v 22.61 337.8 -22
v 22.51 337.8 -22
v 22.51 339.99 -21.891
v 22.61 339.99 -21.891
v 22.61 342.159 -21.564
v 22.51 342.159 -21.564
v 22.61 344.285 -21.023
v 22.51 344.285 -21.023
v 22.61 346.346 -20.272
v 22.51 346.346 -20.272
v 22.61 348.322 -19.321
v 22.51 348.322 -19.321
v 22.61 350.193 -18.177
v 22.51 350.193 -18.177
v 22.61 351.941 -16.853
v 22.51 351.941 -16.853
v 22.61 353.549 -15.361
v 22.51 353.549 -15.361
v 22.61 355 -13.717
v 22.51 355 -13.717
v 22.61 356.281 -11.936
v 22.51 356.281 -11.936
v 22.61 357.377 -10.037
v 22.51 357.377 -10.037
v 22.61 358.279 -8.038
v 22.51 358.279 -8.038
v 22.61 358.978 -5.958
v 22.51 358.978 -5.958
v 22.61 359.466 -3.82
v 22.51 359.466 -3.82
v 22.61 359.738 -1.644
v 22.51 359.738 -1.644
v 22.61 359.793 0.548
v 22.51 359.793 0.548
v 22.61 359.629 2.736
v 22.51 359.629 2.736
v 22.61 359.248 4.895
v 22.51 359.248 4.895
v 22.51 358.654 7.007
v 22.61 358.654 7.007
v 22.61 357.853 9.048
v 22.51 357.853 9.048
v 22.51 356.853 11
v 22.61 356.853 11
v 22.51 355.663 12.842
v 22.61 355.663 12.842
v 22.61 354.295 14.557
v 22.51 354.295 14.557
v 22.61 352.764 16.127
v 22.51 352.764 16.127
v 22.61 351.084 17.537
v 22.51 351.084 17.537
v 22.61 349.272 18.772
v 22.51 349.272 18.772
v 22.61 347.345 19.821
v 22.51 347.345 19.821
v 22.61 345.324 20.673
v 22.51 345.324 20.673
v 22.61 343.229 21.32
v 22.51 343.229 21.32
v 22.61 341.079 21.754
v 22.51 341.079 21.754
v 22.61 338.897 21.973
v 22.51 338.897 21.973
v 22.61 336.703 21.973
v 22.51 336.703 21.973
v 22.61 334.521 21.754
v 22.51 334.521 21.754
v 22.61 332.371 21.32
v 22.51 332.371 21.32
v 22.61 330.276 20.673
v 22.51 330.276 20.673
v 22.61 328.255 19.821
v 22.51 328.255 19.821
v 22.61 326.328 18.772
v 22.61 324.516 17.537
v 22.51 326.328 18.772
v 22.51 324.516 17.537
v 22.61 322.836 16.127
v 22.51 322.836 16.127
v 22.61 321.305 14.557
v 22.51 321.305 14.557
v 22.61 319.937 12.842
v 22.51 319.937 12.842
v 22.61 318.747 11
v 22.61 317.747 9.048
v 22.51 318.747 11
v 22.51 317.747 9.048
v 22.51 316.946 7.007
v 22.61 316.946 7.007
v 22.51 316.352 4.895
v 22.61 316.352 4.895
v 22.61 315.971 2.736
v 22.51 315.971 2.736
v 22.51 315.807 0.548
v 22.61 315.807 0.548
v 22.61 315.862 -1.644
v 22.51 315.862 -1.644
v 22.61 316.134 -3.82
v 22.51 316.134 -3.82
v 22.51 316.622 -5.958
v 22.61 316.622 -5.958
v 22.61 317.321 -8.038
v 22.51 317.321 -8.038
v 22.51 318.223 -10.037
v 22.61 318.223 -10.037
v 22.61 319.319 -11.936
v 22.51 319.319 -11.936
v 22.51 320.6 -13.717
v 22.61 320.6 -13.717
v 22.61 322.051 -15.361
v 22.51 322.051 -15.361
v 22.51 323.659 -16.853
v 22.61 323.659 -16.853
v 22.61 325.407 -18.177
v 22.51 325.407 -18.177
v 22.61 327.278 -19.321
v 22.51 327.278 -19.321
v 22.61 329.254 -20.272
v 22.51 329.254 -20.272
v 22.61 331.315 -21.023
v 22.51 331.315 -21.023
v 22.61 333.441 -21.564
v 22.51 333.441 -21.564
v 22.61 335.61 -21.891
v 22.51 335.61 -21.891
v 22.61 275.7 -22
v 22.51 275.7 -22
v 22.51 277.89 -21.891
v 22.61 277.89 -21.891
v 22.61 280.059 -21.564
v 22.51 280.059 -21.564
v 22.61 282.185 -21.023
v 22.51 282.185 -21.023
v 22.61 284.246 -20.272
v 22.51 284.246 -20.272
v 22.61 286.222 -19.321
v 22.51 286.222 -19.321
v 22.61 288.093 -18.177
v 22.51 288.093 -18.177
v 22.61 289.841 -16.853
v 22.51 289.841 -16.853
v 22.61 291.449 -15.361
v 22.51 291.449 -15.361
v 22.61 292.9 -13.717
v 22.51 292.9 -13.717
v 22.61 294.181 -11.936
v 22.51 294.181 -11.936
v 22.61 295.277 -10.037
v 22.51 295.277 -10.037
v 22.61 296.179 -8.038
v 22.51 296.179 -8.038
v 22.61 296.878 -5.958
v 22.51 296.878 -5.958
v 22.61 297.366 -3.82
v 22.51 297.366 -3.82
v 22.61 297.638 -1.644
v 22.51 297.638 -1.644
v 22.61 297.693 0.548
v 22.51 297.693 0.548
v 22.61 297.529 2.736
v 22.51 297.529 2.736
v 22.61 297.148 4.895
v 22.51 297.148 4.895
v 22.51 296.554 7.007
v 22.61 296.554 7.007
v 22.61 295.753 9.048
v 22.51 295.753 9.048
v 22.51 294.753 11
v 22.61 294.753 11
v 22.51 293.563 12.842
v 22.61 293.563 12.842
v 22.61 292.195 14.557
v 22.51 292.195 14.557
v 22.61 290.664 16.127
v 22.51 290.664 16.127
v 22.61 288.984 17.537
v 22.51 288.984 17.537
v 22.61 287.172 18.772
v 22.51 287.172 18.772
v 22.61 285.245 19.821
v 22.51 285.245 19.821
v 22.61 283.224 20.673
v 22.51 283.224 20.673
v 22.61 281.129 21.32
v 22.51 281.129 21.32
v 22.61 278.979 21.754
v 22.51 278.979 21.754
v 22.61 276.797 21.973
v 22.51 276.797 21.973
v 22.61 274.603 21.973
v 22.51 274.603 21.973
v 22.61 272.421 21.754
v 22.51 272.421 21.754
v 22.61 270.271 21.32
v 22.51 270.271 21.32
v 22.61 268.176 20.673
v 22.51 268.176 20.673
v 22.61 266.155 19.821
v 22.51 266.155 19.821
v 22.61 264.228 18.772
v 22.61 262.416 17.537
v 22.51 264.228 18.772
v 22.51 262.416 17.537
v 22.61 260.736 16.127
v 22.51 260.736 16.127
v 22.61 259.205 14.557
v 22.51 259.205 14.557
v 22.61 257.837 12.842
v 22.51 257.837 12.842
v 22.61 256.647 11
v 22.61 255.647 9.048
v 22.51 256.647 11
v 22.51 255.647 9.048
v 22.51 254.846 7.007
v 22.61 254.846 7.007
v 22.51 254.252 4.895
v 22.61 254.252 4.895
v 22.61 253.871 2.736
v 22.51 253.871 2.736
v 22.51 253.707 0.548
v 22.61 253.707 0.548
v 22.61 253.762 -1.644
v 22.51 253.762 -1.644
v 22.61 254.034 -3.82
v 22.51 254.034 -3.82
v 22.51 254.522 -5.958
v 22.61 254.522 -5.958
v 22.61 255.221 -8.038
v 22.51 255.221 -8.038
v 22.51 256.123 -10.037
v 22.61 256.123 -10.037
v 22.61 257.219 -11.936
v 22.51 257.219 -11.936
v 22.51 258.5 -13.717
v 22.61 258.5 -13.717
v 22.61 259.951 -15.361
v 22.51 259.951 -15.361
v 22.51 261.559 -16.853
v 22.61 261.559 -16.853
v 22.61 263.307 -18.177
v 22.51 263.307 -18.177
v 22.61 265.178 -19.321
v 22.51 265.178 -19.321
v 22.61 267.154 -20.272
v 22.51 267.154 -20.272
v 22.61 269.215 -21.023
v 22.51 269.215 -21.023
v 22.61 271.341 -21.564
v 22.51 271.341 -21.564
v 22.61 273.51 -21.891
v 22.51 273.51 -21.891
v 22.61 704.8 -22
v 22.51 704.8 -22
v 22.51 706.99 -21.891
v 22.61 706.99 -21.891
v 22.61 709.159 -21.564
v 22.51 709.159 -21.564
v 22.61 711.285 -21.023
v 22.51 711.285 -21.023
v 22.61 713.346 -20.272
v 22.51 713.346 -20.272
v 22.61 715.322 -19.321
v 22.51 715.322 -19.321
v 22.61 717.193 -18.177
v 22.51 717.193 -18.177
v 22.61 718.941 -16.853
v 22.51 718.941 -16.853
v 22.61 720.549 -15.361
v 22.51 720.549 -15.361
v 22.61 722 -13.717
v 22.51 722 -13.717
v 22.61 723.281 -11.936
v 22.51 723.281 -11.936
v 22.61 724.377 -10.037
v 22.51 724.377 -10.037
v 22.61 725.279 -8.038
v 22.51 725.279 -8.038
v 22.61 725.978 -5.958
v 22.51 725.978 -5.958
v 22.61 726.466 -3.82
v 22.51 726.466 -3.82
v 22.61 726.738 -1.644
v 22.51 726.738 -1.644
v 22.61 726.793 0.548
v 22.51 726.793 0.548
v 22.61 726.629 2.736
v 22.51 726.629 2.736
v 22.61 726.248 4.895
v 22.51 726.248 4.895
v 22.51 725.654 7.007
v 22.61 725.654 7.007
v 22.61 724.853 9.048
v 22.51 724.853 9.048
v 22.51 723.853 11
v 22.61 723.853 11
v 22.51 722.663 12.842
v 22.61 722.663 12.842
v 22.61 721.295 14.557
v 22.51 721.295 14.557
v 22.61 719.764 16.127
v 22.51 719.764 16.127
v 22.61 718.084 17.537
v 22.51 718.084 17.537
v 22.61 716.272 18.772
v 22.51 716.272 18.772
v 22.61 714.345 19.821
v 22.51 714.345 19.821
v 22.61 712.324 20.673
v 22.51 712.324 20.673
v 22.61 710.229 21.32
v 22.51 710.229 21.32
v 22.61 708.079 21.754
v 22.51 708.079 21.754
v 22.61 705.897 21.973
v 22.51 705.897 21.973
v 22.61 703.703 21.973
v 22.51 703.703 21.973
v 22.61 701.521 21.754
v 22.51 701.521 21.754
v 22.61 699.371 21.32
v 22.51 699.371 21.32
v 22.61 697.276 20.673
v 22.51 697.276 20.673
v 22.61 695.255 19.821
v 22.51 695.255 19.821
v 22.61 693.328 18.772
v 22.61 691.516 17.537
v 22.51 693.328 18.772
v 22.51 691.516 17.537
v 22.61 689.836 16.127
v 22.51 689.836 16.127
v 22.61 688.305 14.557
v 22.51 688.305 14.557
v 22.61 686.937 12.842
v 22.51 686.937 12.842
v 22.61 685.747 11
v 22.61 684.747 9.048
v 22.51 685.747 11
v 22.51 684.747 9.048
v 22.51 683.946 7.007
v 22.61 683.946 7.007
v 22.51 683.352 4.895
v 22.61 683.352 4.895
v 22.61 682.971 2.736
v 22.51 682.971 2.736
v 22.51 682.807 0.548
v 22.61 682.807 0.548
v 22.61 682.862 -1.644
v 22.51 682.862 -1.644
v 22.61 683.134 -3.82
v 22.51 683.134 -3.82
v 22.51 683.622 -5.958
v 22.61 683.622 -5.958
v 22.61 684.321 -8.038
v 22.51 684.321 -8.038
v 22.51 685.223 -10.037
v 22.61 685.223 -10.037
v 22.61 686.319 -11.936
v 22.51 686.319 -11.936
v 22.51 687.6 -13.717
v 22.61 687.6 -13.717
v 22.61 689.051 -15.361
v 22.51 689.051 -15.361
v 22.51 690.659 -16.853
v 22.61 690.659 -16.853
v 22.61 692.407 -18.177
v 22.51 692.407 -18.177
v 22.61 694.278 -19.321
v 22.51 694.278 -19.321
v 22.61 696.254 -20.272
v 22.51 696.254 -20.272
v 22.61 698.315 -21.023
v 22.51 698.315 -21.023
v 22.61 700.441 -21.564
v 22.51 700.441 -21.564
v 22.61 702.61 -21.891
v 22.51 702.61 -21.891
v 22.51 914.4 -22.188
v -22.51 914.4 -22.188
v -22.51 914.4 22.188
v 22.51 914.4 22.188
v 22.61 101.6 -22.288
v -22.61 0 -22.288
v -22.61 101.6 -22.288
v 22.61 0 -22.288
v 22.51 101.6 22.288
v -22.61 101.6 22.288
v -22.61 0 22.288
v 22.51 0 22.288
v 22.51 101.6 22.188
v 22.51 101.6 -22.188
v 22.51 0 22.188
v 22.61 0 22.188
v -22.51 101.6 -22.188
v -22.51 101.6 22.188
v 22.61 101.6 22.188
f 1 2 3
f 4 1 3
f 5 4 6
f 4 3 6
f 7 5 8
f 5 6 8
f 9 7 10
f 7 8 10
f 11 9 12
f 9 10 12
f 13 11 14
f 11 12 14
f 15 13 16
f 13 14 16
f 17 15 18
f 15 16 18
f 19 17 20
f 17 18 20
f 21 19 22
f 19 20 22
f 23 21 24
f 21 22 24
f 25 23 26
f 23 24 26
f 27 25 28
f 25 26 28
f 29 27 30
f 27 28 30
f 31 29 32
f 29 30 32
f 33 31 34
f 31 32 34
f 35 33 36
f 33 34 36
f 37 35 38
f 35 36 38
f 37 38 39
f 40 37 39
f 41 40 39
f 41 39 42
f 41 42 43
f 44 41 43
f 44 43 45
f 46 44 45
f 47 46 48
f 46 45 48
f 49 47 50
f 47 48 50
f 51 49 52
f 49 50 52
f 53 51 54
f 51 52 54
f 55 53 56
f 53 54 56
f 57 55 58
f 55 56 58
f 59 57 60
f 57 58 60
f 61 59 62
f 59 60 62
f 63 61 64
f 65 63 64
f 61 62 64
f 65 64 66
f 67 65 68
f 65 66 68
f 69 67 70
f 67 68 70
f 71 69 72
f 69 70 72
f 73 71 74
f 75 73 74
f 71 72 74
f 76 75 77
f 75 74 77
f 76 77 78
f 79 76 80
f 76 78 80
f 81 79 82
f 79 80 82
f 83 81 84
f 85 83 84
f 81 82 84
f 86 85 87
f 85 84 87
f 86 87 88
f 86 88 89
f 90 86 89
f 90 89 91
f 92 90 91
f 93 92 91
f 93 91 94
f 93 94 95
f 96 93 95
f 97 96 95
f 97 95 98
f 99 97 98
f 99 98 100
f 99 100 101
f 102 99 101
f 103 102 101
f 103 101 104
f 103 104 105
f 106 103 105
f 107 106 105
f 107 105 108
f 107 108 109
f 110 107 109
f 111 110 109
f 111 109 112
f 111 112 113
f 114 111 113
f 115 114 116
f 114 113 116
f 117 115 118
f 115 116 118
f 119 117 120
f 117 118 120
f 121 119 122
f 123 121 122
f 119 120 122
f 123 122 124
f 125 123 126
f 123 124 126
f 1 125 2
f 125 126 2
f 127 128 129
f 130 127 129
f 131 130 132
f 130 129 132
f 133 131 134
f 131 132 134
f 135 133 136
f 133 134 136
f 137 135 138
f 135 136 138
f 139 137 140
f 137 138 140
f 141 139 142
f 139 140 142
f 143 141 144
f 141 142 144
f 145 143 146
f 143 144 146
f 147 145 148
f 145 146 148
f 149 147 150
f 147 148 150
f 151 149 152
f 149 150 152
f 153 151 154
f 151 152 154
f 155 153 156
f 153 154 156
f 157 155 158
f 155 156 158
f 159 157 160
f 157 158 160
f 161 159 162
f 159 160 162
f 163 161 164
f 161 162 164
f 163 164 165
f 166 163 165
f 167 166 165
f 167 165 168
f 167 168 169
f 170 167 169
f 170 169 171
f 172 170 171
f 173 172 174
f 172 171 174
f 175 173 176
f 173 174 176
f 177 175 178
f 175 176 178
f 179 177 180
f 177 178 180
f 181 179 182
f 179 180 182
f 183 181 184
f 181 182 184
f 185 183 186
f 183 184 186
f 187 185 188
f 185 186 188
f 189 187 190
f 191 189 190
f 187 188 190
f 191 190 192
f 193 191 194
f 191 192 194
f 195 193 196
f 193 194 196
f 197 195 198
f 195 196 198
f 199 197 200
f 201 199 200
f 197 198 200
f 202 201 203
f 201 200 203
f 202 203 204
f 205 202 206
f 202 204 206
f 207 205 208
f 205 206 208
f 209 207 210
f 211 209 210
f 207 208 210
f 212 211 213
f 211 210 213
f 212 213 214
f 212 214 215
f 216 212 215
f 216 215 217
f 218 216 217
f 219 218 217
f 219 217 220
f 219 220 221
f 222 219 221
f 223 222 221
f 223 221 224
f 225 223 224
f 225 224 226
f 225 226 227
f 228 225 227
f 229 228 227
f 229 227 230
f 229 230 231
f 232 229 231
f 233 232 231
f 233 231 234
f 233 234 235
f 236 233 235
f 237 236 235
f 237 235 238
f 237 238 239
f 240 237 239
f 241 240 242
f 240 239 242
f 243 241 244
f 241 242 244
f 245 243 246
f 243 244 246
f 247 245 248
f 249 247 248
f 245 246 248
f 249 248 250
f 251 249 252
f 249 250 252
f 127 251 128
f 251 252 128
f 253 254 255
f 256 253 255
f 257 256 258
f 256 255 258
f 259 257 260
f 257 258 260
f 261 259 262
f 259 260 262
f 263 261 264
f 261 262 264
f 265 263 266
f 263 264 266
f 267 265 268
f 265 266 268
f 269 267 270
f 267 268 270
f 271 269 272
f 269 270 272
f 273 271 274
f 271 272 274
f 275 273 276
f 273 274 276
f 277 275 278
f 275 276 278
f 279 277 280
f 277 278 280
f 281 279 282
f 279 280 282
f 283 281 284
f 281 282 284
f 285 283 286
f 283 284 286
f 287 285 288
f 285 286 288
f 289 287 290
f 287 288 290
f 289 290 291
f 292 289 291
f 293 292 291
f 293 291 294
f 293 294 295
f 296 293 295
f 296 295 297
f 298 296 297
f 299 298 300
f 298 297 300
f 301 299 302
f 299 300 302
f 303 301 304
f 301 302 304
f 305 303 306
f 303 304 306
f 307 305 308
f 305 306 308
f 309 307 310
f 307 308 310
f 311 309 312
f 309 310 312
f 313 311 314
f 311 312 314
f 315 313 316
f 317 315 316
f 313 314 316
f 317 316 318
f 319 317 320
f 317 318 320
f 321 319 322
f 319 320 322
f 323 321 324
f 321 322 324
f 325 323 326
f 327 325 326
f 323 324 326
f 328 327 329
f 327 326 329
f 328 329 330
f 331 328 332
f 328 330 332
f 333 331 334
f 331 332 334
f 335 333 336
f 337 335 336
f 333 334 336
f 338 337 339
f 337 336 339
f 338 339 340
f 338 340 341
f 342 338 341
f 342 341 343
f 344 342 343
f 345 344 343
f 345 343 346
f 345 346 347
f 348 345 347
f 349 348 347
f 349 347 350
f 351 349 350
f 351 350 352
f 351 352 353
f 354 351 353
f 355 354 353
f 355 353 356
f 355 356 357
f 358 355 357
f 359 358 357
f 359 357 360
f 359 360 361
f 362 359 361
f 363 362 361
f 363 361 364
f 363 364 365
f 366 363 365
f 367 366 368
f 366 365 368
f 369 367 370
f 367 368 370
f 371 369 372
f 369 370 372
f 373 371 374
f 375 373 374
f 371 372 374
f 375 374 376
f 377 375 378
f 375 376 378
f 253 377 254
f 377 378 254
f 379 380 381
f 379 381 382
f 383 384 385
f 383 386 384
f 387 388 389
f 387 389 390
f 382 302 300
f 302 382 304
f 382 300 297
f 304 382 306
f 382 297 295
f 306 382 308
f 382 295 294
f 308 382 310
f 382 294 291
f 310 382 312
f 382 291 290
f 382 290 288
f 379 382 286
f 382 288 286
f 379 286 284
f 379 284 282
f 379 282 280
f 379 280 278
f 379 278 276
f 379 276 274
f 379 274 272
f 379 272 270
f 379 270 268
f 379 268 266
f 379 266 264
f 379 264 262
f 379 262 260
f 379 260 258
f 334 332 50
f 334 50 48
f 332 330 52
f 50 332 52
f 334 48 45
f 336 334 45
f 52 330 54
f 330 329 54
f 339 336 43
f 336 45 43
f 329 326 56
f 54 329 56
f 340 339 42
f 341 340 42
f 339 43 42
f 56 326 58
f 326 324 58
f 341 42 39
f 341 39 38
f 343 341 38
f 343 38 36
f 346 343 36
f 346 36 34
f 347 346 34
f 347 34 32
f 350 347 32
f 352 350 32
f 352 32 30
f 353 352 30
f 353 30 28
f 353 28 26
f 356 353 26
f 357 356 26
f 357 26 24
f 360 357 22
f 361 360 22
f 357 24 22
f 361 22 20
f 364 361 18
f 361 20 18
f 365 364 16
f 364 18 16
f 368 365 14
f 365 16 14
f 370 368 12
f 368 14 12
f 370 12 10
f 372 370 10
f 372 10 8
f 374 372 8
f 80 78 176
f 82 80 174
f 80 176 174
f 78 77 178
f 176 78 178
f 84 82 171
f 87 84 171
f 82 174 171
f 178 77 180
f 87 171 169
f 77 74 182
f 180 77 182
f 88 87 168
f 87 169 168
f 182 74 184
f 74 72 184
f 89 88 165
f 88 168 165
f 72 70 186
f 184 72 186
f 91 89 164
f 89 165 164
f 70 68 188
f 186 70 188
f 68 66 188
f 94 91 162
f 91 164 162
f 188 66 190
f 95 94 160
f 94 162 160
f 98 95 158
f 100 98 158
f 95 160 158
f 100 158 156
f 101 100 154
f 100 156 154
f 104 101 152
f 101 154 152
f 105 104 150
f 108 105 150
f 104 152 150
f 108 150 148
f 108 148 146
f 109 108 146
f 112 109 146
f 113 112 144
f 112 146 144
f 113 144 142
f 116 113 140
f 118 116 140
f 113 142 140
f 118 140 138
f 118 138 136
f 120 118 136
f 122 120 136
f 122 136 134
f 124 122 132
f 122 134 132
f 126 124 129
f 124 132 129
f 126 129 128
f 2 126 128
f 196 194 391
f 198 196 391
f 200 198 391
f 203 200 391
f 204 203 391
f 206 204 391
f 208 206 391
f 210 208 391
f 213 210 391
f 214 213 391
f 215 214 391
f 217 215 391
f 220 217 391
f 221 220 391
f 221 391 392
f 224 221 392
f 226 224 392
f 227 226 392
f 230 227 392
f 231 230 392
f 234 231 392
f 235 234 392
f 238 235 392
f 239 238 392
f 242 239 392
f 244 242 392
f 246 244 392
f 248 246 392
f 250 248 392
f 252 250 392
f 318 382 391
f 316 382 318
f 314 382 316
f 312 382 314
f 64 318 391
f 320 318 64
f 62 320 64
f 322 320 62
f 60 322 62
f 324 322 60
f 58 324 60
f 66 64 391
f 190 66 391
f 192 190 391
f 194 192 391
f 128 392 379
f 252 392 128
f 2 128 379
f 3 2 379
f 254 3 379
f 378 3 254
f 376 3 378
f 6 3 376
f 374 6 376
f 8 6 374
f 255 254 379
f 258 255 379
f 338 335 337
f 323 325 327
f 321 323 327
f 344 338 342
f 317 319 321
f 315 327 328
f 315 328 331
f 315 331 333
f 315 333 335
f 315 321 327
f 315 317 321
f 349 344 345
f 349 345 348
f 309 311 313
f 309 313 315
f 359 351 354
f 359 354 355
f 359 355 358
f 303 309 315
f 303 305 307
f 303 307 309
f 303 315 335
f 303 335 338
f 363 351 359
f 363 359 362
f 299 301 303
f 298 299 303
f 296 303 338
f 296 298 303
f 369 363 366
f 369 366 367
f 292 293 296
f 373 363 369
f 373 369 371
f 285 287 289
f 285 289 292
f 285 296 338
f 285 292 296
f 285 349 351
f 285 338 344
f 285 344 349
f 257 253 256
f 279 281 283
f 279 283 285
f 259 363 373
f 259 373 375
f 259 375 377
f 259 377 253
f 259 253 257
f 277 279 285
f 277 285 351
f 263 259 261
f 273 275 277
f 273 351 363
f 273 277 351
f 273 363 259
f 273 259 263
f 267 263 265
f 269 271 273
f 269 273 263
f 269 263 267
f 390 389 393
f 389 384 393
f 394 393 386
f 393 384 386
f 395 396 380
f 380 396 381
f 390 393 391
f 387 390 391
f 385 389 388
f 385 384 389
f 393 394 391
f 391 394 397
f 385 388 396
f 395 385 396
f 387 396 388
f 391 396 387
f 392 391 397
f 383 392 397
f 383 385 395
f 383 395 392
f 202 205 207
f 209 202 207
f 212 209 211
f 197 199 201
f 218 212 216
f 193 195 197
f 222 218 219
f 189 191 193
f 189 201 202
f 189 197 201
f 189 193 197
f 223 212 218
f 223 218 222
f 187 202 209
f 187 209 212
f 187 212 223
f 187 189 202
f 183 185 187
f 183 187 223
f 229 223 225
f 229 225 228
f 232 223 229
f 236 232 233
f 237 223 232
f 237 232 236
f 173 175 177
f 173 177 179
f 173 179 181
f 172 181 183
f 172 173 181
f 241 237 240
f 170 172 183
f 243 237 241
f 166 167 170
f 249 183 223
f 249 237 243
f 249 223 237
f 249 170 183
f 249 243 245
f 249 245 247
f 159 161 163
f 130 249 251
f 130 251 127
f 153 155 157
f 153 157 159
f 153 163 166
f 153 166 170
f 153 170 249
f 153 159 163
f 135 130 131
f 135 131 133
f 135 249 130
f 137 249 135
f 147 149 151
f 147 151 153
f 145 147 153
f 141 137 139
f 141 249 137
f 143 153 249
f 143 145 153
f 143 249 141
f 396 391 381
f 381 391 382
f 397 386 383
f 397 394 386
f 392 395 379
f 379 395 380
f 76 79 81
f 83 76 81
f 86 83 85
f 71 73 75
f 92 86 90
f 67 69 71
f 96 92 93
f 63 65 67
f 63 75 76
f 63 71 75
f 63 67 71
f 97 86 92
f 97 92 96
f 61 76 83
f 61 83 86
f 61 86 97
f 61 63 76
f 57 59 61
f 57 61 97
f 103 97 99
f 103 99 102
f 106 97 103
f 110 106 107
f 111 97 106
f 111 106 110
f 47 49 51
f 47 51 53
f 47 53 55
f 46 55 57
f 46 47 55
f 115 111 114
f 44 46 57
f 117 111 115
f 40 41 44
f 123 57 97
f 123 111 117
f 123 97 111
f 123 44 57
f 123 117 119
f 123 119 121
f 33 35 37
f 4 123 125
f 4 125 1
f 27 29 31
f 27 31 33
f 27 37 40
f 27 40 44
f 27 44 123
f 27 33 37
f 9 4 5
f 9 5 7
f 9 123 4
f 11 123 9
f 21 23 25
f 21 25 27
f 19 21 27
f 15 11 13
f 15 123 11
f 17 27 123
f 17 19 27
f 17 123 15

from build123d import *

# Parameters (mm, degrees)
SKETCH1_W           = 45.02
SKETCH1_H           = 44.376857142
BOSS_EXTRUDE1_DEPTH = 914.4
SKETCH2_R           = 22
BOSS_EXTRUDE2_DEPTH = 0.1
SKETCH3_W           = 44.376857142
SKETCH3_H           = 101.6
BOSS_EXTRUDE3_DEPTH = 0.1
SKETCH4_W           = 45.12
SKETCH4_H           = 101.6
BOSS_EXTRUDE4_DEPTH = 0.1
SKETCH5_W           = 44.476857142
SKETCH5_H           = 101.6
BOSS_EXTRUDE5_DEPTH = 0.1
SKETCH6_W           = 45.12
SKETCH6_H           = 101.6
BOSS_EXTRUDE6_DEPTH = 0.1


with BuildPart() as part:
    # Sketch1 → Boss-Extrude1 (new body)
    with BuildSketch(Plane(origin=(0, 0, 0), x_dir=(1, 0, 0), z_dir=(0, 1, 0))):
        Rectangle(SKETCH1_W, SKETCH1_H)
    extrude(amount=BOSS_EXTRUDE1_DEPTH)

    # Sketch2 → Boss-Extrude2 (add)
    with BuildSketch(Plane(origin=(22.51, 0, 0), x_dir=(0, 0, -1), z_dir=(1, 0, 0))):
        with Locations((0, 275.7)):
            Circle(SKETCH2_R)
        with Locations((0, 337.8)):
            Circle(SKETCH2_R)
        with Locations((0, 704.8)):
            Circle(SKETCH2_R)
    extrude(amount=BOSS_EXTRUDE2_DEPTH)

    # Sketch3 → Boss-Extrude3 (add)
    with BuildSketch(Plane(origin=(22.51, 0, 0), x_dir=(0, 0, -1), z_dir=(1, 0, 0))):
        with Locations((0, 50.8)):
            Rectangle(SKETCH3_W, SKETCH3_H)
    extrude(amount=BOSS_EXTRUDE3_DEPTH)

    # Sketch4 → Boss-Extrude4 (add)
    with BuildSketch(Plane(origin=(0, 0, -22.188428571), x_dir=(-1, 0, 0), z_dir=(0, 0, -1))):
        with Locations((-0.05, 50.8)):
            Rectangle(SKETCH4_W, SKETCH4_H)
    extrude(amount=BOSS_EXTRUDE4_DEPTH)

    # Sketch5 → Boss-Extrude5 (add)
    with BuildSketch(Plane.ZY.offset(22.51)):
        with Locations((-0.05, 50.8)):
            Rectangle(SKETCH5_W, SKETCH5_H)
    extrude(amount=BOSS_EXTRUDE5_DEPTH)

    # Sketch6 → Boss-Extrude6 (add)
    with BuildSketch(Plane.XY.offset(22.188428571)):
        with Locations((-0.05, 50.8)):
            Rectangle(SKETCH6_W, SKETCH6_H)
    extrude(amount=BOSS_EXTRUDE6_DEPTH)


solid = part.part
